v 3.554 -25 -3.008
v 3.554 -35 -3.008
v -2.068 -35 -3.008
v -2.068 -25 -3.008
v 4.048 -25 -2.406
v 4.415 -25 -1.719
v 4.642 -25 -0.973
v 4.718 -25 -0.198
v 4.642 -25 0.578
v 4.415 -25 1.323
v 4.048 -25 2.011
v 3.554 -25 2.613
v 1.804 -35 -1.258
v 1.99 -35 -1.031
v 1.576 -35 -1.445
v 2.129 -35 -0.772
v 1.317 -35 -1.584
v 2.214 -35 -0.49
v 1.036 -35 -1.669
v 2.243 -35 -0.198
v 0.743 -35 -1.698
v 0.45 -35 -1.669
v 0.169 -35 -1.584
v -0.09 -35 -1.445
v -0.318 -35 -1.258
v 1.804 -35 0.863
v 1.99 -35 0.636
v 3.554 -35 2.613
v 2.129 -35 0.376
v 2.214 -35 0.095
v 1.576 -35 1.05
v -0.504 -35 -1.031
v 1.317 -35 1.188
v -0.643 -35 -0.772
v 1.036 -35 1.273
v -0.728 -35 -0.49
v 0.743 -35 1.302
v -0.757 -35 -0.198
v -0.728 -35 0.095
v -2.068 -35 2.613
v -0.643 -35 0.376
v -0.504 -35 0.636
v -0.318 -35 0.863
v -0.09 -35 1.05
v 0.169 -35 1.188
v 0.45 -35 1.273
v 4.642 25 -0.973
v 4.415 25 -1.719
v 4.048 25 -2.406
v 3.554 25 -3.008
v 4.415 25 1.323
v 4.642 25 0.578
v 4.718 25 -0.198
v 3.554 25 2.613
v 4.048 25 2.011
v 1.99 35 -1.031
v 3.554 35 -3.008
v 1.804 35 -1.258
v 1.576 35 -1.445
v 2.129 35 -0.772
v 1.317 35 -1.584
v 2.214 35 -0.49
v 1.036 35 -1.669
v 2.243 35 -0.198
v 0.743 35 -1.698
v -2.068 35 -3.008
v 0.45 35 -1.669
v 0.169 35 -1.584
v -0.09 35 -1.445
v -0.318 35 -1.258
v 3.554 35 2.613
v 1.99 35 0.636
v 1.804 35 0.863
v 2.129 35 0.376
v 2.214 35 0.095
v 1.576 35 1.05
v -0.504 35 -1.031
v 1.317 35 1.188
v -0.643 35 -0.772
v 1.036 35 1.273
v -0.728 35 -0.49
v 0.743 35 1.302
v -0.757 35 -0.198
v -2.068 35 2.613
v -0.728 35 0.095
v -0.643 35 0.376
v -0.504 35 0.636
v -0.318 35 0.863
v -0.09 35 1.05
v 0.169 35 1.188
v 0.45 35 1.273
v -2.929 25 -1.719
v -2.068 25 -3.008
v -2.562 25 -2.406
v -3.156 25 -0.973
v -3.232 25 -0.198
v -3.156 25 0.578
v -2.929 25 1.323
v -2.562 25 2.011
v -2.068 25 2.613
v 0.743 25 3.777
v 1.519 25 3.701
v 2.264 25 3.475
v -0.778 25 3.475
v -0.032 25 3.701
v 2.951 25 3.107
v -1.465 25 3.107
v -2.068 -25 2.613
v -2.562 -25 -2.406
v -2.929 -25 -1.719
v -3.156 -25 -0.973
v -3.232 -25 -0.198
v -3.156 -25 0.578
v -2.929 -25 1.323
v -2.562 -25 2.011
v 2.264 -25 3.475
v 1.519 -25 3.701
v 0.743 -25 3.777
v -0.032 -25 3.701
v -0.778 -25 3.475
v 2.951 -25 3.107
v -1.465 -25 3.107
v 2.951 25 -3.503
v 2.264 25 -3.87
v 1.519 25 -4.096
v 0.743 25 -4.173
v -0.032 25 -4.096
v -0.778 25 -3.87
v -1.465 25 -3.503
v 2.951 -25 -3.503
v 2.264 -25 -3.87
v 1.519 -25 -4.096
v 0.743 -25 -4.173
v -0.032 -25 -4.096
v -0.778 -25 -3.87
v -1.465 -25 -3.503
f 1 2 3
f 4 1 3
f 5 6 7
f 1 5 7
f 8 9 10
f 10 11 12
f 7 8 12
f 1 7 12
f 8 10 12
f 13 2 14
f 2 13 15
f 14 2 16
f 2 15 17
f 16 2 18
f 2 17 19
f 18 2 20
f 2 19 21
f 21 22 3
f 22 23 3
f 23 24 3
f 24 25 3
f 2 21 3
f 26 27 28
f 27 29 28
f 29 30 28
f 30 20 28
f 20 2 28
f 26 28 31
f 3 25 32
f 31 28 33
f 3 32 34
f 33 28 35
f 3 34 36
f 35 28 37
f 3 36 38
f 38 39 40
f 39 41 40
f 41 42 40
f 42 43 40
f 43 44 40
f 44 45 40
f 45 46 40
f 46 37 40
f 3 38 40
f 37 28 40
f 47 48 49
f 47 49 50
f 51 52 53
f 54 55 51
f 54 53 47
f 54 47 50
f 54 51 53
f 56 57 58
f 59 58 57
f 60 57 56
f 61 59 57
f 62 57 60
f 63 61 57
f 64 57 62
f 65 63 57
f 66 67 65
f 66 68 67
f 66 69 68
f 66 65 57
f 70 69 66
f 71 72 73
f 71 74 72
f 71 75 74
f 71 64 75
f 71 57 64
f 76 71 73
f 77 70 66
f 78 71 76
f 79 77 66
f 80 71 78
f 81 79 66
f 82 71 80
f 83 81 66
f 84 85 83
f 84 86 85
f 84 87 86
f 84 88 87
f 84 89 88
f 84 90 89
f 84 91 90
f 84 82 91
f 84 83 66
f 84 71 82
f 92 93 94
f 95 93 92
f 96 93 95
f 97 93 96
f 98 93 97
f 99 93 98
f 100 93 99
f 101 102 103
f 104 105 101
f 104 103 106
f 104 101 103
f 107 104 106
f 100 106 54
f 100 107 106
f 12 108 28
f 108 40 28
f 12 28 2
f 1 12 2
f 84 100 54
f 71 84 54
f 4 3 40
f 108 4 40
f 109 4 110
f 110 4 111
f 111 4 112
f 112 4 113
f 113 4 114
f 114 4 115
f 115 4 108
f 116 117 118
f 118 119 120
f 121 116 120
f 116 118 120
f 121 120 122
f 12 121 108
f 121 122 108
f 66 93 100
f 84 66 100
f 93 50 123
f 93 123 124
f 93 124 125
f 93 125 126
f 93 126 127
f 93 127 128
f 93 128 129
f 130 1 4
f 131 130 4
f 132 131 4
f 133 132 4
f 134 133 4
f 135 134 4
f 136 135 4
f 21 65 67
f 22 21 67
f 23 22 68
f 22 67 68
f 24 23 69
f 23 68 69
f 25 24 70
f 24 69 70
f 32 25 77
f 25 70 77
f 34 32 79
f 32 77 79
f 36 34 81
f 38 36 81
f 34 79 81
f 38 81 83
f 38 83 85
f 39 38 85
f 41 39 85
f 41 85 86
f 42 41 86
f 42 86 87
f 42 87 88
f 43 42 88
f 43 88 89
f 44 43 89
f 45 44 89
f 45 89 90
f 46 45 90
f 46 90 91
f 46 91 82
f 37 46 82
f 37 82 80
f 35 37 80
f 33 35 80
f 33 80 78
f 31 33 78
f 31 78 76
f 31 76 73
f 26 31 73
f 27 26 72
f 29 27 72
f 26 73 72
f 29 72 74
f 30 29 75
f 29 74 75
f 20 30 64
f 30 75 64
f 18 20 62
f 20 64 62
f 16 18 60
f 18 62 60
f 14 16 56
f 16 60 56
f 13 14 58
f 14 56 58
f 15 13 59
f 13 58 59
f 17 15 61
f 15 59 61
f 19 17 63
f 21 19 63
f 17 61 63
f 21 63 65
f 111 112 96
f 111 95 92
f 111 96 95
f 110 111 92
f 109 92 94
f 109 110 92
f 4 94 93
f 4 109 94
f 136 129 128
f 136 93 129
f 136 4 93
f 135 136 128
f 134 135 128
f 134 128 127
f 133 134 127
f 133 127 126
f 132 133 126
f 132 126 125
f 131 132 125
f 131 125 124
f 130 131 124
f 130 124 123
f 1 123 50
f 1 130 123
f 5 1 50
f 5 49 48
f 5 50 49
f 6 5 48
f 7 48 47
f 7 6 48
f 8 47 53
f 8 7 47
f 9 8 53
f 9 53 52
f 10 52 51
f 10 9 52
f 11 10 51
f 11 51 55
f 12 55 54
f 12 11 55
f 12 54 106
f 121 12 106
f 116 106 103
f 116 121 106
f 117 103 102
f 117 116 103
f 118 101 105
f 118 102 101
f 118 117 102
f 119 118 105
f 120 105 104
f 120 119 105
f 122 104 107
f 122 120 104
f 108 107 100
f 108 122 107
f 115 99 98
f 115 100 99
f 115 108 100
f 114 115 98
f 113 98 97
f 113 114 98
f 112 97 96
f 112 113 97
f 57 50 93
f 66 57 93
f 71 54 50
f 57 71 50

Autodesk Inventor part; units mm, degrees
ref_plane "YZ Plane" through (0, 0, 0) normal (1, 0, 0) x (0, 1, 0)
ref_plane "XZ Plane" through (0, 0, 0) normal (0, 1, 0) x (-1, 0, 0)
ref_plane "XY Plane" through (0, 0, 0) normal (0, 0, 1) x (1, 0, 0)
sketch "Sketch1" plane through (0, 0, 0) normal (0, 1, 0) x (-1, 0, 0)
  line L0 (2.0677, 2.6131) -> (-3.5538, 2.6131)
  line L1 (-3.5538, 2.6131) -> (-3.5538, -3.0084)
  line L2 (-3.5538, -3.0084) -> (2.0677, -3.0084)
  line L3 (2.0677, -3.0084) -> (2.0677, 2.6131)
  circle A0 centre (-0.743, -0.1977) radius 3.975
  point P0 (0, 0)
  dimension "d0" = 7.95
extrude "Extrusion1" add sketch "Sketch1" along normal mid plane 50
extrude "Extrusion2" add sketch "Sketch1" along normal mid plane 70 contours L3 L2 L1 L0
hole "Hole1" at (0.743, -35, -0.1977) direction (0, 1, 0) diameter 3 end through all
properties part number "crankshaft_bearing_mounts"
